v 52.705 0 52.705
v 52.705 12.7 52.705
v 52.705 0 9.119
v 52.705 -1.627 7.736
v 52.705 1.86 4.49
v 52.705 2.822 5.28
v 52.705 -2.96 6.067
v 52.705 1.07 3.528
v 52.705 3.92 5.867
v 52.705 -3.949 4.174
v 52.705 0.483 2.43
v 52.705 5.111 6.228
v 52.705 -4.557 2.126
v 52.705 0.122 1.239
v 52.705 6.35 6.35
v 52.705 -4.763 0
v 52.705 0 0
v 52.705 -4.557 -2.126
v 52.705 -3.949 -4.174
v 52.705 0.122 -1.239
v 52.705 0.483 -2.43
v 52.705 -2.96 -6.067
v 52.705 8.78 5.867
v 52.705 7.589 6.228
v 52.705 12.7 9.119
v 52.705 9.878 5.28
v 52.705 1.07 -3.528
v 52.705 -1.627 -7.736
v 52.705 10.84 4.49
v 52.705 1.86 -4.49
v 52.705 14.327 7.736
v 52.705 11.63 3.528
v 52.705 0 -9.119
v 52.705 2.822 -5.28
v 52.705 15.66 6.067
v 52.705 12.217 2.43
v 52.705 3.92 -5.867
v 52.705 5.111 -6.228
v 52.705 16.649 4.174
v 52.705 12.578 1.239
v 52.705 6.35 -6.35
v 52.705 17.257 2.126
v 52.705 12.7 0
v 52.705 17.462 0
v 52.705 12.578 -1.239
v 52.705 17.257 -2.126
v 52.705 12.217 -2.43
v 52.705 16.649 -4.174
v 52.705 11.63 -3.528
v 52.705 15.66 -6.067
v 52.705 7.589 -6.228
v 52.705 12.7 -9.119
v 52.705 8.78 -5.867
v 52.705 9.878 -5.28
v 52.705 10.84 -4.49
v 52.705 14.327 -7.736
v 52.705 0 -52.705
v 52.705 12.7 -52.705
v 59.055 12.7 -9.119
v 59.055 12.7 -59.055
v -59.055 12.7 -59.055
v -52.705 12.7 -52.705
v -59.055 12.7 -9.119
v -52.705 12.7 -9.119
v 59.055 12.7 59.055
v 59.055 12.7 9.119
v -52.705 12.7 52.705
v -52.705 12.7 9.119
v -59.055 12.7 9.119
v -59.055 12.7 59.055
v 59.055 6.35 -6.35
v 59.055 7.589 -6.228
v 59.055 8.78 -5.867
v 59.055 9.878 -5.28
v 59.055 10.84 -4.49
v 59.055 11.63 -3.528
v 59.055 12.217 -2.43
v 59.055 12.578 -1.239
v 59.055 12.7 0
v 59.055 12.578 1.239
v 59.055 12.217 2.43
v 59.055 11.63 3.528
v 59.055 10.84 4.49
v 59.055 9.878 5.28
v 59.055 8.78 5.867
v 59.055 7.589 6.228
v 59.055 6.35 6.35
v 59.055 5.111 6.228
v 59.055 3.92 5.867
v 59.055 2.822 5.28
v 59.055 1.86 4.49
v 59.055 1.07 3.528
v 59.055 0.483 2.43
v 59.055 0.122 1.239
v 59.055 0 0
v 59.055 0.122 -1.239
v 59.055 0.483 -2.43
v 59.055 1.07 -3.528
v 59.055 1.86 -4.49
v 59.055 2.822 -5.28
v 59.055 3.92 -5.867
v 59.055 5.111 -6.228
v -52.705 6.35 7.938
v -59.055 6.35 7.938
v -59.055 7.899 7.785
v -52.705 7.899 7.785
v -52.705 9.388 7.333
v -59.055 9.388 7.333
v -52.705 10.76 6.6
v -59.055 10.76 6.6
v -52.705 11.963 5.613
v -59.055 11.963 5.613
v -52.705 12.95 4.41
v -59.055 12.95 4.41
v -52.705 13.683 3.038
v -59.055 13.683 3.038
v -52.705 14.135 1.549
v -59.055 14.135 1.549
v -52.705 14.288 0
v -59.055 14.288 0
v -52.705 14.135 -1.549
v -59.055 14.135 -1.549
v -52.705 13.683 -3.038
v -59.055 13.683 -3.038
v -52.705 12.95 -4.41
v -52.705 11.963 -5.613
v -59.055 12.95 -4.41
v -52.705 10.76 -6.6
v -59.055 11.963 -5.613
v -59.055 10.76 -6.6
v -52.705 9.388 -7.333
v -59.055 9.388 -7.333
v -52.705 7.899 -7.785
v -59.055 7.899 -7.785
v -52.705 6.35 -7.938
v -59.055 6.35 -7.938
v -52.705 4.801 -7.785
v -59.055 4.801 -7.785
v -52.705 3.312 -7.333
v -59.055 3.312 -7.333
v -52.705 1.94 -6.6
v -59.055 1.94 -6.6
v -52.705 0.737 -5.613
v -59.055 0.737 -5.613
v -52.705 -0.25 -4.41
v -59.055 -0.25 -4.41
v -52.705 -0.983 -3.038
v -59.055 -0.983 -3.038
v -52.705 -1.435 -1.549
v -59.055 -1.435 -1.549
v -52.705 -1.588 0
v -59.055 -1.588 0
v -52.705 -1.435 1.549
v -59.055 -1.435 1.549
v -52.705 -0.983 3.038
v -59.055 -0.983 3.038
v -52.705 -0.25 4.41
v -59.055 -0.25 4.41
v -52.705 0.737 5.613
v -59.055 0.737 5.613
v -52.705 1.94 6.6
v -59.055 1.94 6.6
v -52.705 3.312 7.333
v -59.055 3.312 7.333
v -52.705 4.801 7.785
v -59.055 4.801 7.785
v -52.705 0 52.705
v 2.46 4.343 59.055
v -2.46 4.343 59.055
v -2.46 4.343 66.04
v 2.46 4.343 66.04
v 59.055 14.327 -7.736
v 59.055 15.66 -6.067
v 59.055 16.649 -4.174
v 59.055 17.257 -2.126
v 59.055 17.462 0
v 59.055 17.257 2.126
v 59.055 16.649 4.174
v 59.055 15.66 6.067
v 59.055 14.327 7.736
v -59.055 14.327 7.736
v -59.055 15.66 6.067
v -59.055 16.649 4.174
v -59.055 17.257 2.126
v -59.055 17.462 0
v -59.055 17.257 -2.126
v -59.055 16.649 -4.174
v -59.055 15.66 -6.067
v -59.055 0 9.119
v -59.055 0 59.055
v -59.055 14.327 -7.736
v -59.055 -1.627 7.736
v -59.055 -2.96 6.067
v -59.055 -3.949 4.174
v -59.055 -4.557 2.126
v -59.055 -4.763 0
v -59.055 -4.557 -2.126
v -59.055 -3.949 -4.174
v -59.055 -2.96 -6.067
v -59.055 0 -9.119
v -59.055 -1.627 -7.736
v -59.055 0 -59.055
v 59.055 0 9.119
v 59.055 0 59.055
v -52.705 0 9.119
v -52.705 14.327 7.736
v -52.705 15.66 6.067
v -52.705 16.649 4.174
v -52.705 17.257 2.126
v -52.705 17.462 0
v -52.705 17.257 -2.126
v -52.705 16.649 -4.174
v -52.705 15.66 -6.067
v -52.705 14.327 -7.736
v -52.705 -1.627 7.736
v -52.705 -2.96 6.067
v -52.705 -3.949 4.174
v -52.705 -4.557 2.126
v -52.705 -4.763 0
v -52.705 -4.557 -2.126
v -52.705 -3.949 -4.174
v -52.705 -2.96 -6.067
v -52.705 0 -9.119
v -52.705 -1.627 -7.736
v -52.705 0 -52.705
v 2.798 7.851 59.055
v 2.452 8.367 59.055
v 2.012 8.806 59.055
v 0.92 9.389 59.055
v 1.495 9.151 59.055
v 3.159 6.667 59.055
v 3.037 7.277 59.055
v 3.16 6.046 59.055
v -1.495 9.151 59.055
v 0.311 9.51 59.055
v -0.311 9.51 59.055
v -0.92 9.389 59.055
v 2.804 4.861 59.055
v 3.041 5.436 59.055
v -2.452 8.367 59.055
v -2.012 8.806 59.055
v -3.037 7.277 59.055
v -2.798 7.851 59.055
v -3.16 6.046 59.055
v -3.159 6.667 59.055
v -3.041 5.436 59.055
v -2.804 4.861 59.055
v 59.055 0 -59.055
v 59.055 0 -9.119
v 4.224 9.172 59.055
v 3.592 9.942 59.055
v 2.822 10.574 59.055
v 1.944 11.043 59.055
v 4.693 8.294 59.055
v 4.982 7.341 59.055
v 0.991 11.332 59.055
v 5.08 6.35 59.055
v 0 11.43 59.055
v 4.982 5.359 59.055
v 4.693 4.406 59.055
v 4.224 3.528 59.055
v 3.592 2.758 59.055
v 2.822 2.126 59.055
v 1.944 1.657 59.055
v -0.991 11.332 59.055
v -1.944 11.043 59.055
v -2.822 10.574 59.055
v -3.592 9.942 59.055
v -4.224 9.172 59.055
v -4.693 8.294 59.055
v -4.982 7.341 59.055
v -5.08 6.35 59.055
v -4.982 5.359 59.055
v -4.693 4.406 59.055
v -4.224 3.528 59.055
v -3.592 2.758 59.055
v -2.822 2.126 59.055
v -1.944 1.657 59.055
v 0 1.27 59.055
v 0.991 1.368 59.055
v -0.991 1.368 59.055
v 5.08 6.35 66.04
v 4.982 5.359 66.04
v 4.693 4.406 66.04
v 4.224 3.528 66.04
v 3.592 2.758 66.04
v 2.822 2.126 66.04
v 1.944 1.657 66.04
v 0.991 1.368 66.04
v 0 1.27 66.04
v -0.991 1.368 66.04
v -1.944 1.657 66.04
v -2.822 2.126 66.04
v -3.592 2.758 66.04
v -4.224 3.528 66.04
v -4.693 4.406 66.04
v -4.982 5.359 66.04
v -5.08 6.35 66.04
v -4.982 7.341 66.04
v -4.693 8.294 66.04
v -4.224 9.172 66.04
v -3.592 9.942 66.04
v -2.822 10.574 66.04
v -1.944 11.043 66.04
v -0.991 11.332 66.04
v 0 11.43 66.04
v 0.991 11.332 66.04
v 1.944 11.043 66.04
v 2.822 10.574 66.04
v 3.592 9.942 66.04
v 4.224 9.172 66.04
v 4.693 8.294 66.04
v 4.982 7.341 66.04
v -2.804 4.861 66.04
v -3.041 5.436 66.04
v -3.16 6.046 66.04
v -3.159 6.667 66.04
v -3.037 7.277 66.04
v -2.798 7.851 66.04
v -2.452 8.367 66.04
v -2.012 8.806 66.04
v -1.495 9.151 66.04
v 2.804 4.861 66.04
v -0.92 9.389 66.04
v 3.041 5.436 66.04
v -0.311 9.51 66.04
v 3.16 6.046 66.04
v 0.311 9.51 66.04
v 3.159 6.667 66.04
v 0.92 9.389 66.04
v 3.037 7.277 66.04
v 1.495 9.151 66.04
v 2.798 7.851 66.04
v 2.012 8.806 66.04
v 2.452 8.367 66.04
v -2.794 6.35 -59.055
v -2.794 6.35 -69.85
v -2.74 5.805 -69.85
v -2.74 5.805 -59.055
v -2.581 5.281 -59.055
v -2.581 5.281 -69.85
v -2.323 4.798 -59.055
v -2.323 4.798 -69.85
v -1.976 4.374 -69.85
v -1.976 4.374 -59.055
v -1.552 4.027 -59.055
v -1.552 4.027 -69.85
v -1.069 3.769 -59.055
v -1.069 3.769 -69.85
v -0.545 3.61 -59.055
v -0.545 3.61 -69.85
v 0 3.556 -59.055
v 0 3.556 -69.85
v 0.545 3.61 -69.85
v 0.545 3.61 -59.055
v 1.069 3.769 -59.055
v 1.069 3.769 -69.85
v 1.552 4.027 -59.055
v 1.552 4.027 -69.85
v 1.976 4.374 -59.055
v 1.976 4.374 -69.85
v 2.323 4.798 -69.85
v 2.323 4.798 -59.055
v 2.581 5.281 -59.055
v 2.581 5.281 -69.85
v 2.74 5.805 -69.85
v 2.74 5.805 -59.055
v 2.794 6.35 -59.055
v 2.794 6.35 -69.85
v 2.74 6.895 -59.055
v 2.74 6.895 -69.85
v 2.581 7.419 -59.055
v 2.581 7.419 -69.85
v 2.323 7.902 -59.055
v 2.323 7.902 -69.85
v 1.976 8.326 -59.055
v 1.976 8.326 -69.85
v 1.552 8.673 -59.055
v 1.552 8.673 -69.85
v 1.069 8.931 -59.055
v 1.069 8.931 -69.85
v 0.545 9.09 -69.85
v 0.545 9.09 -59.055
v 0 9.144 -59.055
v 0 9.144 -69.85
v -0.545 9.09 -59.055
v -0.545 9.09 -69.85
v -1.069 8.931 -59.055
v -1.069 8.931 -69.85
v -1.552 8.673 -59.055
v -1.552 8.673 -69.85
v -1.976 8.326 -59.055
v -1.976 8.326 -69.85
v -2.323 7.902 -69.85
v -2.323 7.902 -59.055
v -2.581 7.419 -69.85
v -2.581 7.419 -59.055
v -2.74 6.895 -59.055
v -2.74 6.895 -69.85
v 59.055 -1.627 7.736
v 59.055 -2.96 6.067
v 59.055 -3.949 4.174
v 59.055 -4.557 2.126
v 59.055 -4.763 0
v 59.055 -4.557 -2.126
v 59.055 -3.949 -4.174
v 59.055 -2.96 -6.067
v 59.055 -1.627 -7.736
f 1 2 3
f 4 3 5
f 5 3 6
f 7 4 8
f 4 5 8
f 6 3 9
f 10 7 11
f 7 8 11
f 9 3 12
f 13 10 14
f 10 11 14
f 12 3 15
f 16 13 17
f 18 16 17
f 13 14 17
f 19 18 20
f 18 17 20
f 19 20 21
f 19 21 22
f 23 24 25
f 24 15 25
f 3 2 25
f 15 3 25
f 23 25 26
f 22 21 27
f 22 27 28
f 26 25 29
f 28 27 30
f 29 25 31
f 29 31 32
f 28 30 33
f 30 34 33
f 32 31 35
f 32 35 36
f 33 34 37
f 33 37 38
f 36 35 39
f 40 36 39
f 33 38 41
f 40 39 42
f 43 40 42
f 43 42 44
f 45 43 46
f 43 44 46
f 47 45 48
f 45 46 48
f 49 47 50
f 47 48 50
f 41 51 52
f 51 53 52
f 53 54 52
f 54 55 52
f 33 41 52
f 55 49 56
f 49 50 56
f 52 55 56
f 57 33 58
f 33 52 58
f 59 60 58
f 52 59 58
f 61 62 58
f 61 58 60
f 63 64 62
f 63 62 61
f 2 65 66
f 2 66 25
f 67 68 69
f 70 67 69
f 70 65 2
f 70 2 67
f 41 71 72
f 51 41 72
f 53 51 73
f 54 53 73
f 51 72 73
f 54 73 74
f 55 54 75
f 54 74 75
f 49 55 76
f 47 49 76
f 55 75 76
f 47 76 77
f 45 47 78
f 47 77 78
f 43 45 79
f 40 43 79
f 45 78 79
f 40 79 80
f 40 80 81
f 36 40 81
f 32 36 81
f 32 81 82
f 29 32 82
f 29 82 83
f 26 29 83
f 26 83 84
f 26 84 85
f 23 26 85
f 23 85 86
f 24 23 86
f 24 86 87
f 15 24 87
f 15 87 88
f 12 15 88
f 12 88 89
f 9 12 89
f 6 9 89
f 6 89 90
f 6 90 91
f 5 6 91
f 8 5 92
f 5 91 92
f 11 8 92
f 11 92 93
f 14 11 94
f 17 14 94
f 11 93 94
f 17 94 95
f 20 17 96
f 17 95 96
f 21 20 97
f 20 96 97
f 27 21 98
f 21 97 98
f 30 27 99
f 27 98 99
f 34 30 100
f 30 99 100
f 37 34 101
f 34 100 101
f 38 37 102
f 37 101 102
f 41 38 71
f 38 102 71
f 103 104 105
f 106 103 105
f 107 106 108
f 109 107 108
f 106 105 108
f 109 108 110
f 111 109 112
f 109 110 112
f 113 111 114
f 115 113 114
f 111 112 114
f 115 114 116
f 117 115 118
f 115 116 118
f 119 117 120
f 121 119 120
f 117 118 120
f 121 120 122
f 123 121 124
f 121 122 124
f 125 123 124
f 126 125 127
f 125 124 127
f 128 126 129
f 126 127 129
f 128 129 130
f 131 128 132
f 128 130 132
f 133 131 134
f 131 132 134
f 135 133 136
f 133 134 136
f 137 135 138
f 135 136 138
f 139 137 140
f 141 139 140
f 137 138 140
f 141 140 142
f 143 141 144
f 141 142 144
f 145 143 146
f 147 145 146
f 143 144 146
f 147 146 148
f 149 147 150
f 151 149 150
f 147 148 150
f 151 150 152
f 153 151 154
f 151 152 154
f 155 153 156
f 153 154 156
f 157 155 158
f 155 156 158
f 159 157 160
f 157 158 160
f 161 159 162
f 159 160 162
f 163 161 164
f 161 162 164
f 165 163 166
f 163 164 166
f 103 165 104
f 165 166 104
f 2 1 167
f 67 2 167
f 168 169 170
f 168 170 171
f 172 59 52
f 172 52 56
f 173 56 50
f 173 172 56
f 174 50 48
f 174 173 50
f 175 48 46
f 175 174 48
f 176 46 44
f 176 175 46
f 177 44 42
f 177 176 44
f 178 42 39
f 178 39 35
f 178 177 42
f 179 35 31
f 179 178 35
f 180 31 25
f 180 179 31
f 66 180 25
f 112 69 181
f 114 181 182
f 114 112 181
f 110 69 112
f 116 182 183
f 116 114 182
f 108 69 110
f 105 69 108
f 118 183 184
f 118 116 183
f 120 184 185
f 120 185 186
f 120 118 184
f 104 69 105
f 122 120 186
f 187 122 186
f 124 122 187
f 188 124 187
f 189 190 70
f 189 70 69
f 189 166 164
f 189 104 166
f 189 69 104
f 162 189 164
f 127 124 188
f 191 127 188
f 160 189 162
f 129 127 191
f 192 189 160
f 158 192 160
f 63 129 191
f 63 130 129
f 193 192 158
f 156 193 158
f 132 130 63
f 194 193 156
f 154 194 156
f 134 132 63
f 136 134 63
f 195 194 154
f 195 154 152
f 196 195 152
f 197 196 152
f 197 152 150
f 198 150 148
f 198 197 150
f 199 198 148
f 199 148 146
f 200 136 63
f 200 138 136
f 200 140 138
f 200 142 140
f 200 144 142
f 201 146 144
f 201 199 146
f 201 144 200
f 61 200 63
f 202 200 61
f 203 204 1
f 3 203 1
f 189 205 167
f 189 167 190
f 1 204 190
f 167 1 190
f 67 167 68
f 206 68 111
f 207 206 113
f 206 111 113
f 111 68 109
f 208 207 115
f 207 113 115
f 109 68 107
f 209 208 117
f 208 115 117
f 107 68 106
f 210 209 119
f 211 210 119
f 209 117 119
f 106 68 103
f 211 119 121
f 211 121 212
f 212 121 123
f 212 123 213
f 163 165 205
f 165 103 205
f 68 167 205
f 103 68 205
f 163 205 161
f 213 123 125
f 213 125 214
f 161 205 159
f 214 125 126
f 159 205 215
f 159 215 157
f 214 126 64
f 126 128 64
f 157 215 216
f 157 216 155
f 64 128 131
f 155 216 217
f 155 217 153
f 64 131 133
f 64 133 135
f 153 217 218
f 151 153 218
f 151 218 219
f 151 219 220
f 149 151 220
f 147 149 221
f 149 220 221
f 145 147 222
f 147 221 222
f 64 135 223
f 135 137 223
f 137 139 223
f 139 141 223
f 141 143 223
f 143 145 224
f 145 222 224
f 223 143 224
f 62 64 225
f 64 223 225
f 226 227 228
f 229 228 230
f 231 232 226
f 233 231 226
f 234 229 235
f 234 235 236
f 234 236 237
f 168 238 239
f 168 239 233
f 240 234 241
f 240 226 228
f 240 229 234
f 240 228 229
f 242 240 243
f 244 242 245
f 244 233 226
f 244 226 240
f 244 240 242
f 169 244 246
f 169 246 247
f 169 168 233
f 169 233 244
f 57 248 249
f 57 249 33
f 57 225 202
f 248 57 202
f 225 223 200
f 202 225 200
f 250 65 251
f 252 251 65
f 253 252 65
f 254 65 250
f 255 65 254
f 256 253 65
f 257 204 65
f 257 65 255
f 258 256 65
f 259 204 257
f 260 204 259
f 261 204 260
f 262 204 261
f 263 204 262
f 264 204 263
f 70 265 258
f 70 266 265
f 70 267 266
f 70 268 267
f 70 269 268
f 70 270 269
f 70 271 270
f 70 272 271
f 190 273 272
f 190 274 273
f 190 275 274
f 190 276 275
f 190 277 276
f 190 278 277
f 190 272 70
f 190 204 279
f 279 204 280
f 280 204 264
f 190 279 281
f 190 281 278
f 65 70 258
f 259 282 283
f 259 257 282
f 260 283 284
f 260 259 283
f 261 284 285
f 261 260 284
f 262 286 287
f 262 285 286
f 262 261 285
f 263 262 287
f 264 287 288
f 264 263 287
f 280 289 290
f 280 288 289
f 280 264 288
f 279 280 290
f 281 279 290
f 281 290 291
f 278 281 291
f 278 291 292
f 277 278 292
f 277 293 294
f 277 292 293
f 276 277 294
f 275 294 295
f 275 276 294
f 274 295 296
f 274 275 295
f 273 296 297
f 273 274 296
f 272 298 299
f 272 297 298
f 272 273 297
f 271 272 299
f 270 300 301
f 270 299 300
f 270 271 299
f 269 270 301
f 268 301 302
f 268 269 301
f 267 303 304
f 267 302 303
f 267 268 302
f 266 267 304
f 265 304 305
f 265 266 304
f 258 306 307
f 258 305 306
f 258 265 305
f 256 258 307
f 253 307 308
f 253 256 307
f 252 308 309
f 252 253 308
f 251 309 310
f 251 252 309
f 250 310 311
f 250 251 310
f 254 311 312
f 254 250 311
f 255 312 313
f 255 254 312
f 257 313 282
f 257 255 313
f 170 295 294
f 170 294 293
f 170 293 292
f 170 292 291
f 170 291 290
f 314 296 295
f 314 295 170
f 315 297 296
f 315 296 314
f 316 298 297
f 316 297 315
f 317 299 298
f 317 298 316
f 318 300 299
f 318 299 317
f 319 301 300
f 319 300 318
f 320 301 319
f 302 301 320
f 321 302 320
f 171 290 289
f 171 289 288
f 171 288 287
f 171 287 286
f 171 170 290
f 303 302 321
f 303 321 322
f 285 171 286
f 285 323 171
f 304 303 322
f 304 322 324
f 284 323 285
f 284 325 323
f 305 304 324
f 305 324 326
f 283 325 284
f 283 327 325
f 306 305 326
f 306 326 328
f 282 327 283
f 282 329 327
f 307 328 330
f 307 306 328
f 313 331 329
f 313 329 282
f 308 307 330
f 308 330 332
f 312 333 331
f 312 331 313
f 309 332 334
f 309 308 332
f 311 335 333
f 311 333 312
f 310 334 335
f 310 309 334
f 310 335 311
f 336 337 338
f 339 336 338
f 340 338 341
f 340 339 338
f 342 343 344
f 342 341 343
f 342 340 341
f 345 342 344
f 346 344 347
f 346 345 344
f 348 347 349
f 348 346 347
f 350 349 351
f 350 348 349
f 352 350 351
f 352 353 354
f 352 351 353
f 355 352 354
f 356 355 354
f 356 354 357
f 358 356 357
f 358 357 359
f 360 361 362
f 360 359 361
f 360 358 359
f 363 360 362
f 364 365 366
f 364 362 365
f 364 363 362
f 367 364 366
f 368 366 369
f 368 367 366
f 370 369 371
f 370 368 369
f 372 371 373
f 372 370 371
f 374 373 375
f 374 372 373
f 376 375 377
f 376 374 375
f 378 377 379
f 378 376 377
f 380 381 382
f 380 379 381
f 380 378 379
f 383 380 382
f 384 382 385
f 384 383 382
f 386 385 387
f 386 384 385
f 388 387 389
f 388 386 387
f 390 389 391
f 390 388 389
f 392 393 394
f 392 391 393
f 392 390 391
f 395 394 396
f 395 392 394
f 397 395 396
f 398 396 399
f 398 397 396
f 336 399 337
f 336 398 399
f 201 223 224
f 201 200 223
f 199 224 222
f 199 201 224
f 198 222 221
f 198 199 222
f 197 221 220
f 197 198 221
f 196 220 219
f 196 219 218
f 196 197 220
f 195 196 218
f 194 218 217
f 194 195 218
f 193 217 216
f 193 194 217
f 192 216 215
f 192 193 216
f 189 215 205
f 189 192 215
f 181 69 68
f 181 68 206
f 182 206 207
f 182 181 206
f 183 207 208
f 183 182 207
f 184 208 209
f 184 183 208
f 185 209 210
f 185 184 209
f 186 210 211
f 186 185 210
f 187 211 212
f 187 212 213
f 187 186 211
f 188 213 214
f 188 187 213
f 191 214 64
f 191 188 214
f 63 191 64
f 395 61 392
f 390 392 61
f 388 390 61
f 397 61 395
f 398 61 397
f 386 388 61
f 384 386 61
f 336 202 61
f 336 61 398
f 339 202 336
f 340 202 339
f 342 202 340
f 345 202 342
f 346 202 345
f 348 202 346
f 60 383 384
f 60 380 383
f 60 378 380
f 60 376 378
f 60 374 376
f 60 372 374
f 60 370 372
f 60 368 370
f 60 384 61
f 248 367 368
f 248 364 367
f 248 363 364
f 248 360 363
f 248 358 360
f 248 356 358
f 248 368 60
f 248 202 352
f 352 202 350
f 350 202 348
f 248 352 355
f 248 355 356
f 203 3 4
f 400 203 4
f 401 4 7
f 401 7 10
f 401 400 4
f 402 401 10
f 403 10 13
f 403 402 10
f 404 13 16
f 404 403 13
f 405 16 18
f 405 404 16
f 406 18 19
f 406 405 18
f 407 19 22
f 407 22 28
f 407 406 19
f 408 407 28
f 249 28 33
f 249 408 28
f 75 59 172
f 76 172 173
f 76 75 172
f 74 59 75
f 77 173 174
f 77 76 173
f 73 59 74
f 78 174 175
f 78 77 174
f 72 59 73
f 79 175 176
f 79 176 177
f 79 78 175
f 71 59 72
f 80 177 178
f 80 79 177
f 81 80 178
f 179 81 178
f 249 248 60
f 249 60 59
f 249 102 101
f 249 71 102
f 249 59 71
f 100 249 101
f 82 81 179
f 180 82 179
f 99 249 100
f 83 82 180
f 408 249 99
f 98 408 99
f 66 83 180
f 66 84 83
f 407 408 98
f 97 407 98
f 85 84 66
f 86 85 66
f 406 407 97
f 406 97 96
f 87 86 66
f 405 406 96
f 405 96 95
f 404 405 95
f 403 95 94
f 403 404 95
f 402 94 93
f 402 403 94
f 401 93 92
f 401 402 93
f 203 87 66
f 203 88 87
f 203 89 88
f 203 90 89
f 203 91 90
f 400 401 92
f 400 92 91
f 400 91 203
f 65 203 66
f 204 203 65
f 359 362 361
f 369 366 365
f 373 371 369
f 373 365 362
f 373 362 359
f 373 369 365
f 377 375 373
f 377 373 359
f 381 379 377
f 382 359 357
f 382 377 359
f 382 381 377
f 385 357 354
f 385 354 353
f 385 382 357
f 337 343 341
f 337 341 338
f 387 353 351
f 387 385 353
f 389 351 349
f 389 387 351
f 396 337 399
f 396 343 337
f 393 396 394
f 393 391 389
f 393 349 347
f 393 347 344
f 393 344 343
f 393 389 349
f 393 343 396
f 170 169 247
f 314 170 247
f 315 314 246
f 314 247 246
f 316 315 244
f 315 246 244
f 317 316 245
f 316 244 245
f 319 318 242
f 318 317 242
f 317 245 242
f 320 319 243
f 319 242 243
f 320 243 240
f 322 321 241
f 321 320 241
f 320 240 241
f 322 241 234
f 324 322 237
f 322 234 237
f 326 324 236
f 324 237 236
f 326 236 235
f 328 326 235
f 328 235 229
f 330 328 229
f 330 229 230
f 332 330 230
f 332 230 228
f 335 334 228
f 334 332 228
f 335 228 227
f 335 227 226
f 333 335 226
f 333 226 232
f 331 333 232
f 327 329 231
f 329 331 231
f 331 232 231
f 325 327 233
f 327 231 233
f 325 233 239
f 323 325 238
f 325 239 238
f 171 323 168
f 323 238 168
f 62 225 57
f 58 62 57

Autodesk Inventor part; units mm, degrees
ref_plane "YZ Plane" through (0, 0, 0) normal (1, 0, 0) x (0, 1, 0)
ref_plane "XZ Plane" through (0, 0, 0) normal (0, 1, 0) x (-1, 0, 0)
ref_plane "XY Plane" through (0, 0, 0) normal (0, 0, 1) x (1, 0, 0)
sketch "Sketch1" plane through (0, 0, 0) normal (0, 1, 0) x (-1, 0, 0)
  line L0 (-52.705, 52.705) -> (52.705, 52.705)
  line L1 (52.705, 52.705) -> (52.705, -52.705)
  line L2 (52.705, -52.705) -> (-52.705, -52.705)
  line L3 (-52.705, -52.705) -> (-52.705, 52.705)
  line L4 (-52.705, 52.705) -> (52.705, -52.705) construction
  line L5 (52.705, 52.705) -> (-52.705, -52.705) construction
  line L6 (-59.055, 59.055) -> (59.055, 59.055)
  line L7 (59.055, 59.055) -> (59.055, -59.055)
  line L8 (59.055, -59.055) -> (-59.055, -59.055)
  line L9 (-59.055, -59.055) -> (-59.055, 59.055)
  line L10 (-59.055, 59.055) -> (59.055, -59.055) construction
  line L11 (59.055, 59.055) -> (-59.055, -59.055) construction
  point P0 (0, 0)
  dimension "d0" = 105.41
  dimension "d1" = 105.41
  dimension "d2" = 118.11
  dimension "d3" = 118.11
extrude "Extrusion1" add sketch "Sketch1" along normal blind 12.7
sketch "Sketch2" plane through (-59.055, 0, -59.055) normal (-1, 0, 0) x (0, 0, 1)
  circle A0 centre (59.055, 6.35) radius 11.1125
  line L0 (0, 0) -> (0, 12.7) construction
  line L1 (0, 6.35) -> (59.055, 6.35) construction
  line L2 (59.055, 6.35) -> (118.11, 6.35) construction
  line L3 (118.11, 0) -> (118.11, 12.7) construction
  point P0 (59.055, 0)
  dimension "d6" = 22.225
extrude "Extrusion2" add sketch "Sketch2" against normal up to surface (6.35 mm away)
sketch "Sketch3" plane through (-59.055, 0, -59.055) normal (-1, 0, 0) x (0, 0, 1)
  circle A0 centre (59.055, 6.35) radius 7.9375
  line L0 (0, 0) -> (0, 12.7) construction
  line L1 (0, 6.35) -> (59.055, 6.35) construction
  line L2 (59.055, 6.35) -> (118.11, 6.35) construction
  line L3 (118.11, 0) -> (118.11, 12.7) construction
  point P0 (59.055, 0)
  dimension "d9" = 15.875
extrude "Extrusion3" cut sketch "Sketch3" against normal up to next
sketch "Sketch4" plane through (59.055, 0, 59.055) normal (1, 0, 0) x (0, 0, -1)
  circle A0 centre (59.055, 6.35) radius 11.1125
  line L0 (0, 0) -> (0, 12.7) construction
  line L1 (0, 6.35) -> (59.055, 6.35) construction
  line L2 (59.055, 6.35) -> (118.11, 6.35) construction
  line L3 (118.11, 0) -> (118.11, 12.7) construction
  point P0 (59.055, 0)
  dimension "d24" = 22.225
extrude "Extrusion4" add sketch "Sketch4" against normal up to surface (6.35 mm away)
sketch "Sketch5" plane through (59.055, 0, 59.055) normal (1, 0, 0) x (0, 0, -1)
  circle A0 centre (59.055, 6.35) radius 6.35
  line L0 (0, 0) -> (0, 12.7) construction
  line L1 (0, 6.35) -> (59.055, 6.35) construction
  line L2 (59.055, 6.35) -> (118.11, 6.35) construction
  line L3 (118.11, 0) -> (118.11, 12.7) construction
  point P0 (59.055, 0)
  dimension "d14" = 12.7
extrude "Extrusion5" cut sketch "Sketch5" against normal up to next
sketch "Sketch6" plane through (59.055, 0, -59.055) normal (0, 0, -1) x (-1, 0, 0)
  circle A0 centre (59.055, 6.35) radius 2.794
  line L0 (0, 0) -> (0, 12.7) construction
  line L1 (0, 6.35) -> (59.055, 6.35) construction
  line L2 (59.055, 6.35) -> (118.11, 6.35) construction
  line L3 (118.11, 14.2875) -> (118.11, -1.5875) construction
  point P0 (59.055, 0)
  dimension "d17" = 5.588
extrude "Extrusion6" add sketch "Sketch6" along normal blind 10.795
sketch "Sketch7" plane through (-59.055, 0, 59.055) normal (0, 0, 1) x (1, 0, 0)
  arc A0 (61.5154, 4.3432) -> (56.5946, 4.3432) centre (59.055, 6.35) ccw
  circle A1 centre (59.055, 6.35) radius 5.08
  line L0 (56.5946, 4.3432) -> (61.5154, 4.3432)
  line L1 (118.11, 0) -> (118.11, 12.7) construction
  line L2 (118.11, 6.35) -> (59.055, 6.35) construction
  line L3 (59.055, 6.35) -> (0, 6.35) construction
  line L4 (0, 0) -> (0, 12.7) construction
  point P0 (59.055, 0)
  dimension "d20" = 6.35
  dimension "d21" = 10.16
extrude "Extrusion7" add sketch "Sketch7" along normal blind 6.985
properties part number "joystick_outer"
